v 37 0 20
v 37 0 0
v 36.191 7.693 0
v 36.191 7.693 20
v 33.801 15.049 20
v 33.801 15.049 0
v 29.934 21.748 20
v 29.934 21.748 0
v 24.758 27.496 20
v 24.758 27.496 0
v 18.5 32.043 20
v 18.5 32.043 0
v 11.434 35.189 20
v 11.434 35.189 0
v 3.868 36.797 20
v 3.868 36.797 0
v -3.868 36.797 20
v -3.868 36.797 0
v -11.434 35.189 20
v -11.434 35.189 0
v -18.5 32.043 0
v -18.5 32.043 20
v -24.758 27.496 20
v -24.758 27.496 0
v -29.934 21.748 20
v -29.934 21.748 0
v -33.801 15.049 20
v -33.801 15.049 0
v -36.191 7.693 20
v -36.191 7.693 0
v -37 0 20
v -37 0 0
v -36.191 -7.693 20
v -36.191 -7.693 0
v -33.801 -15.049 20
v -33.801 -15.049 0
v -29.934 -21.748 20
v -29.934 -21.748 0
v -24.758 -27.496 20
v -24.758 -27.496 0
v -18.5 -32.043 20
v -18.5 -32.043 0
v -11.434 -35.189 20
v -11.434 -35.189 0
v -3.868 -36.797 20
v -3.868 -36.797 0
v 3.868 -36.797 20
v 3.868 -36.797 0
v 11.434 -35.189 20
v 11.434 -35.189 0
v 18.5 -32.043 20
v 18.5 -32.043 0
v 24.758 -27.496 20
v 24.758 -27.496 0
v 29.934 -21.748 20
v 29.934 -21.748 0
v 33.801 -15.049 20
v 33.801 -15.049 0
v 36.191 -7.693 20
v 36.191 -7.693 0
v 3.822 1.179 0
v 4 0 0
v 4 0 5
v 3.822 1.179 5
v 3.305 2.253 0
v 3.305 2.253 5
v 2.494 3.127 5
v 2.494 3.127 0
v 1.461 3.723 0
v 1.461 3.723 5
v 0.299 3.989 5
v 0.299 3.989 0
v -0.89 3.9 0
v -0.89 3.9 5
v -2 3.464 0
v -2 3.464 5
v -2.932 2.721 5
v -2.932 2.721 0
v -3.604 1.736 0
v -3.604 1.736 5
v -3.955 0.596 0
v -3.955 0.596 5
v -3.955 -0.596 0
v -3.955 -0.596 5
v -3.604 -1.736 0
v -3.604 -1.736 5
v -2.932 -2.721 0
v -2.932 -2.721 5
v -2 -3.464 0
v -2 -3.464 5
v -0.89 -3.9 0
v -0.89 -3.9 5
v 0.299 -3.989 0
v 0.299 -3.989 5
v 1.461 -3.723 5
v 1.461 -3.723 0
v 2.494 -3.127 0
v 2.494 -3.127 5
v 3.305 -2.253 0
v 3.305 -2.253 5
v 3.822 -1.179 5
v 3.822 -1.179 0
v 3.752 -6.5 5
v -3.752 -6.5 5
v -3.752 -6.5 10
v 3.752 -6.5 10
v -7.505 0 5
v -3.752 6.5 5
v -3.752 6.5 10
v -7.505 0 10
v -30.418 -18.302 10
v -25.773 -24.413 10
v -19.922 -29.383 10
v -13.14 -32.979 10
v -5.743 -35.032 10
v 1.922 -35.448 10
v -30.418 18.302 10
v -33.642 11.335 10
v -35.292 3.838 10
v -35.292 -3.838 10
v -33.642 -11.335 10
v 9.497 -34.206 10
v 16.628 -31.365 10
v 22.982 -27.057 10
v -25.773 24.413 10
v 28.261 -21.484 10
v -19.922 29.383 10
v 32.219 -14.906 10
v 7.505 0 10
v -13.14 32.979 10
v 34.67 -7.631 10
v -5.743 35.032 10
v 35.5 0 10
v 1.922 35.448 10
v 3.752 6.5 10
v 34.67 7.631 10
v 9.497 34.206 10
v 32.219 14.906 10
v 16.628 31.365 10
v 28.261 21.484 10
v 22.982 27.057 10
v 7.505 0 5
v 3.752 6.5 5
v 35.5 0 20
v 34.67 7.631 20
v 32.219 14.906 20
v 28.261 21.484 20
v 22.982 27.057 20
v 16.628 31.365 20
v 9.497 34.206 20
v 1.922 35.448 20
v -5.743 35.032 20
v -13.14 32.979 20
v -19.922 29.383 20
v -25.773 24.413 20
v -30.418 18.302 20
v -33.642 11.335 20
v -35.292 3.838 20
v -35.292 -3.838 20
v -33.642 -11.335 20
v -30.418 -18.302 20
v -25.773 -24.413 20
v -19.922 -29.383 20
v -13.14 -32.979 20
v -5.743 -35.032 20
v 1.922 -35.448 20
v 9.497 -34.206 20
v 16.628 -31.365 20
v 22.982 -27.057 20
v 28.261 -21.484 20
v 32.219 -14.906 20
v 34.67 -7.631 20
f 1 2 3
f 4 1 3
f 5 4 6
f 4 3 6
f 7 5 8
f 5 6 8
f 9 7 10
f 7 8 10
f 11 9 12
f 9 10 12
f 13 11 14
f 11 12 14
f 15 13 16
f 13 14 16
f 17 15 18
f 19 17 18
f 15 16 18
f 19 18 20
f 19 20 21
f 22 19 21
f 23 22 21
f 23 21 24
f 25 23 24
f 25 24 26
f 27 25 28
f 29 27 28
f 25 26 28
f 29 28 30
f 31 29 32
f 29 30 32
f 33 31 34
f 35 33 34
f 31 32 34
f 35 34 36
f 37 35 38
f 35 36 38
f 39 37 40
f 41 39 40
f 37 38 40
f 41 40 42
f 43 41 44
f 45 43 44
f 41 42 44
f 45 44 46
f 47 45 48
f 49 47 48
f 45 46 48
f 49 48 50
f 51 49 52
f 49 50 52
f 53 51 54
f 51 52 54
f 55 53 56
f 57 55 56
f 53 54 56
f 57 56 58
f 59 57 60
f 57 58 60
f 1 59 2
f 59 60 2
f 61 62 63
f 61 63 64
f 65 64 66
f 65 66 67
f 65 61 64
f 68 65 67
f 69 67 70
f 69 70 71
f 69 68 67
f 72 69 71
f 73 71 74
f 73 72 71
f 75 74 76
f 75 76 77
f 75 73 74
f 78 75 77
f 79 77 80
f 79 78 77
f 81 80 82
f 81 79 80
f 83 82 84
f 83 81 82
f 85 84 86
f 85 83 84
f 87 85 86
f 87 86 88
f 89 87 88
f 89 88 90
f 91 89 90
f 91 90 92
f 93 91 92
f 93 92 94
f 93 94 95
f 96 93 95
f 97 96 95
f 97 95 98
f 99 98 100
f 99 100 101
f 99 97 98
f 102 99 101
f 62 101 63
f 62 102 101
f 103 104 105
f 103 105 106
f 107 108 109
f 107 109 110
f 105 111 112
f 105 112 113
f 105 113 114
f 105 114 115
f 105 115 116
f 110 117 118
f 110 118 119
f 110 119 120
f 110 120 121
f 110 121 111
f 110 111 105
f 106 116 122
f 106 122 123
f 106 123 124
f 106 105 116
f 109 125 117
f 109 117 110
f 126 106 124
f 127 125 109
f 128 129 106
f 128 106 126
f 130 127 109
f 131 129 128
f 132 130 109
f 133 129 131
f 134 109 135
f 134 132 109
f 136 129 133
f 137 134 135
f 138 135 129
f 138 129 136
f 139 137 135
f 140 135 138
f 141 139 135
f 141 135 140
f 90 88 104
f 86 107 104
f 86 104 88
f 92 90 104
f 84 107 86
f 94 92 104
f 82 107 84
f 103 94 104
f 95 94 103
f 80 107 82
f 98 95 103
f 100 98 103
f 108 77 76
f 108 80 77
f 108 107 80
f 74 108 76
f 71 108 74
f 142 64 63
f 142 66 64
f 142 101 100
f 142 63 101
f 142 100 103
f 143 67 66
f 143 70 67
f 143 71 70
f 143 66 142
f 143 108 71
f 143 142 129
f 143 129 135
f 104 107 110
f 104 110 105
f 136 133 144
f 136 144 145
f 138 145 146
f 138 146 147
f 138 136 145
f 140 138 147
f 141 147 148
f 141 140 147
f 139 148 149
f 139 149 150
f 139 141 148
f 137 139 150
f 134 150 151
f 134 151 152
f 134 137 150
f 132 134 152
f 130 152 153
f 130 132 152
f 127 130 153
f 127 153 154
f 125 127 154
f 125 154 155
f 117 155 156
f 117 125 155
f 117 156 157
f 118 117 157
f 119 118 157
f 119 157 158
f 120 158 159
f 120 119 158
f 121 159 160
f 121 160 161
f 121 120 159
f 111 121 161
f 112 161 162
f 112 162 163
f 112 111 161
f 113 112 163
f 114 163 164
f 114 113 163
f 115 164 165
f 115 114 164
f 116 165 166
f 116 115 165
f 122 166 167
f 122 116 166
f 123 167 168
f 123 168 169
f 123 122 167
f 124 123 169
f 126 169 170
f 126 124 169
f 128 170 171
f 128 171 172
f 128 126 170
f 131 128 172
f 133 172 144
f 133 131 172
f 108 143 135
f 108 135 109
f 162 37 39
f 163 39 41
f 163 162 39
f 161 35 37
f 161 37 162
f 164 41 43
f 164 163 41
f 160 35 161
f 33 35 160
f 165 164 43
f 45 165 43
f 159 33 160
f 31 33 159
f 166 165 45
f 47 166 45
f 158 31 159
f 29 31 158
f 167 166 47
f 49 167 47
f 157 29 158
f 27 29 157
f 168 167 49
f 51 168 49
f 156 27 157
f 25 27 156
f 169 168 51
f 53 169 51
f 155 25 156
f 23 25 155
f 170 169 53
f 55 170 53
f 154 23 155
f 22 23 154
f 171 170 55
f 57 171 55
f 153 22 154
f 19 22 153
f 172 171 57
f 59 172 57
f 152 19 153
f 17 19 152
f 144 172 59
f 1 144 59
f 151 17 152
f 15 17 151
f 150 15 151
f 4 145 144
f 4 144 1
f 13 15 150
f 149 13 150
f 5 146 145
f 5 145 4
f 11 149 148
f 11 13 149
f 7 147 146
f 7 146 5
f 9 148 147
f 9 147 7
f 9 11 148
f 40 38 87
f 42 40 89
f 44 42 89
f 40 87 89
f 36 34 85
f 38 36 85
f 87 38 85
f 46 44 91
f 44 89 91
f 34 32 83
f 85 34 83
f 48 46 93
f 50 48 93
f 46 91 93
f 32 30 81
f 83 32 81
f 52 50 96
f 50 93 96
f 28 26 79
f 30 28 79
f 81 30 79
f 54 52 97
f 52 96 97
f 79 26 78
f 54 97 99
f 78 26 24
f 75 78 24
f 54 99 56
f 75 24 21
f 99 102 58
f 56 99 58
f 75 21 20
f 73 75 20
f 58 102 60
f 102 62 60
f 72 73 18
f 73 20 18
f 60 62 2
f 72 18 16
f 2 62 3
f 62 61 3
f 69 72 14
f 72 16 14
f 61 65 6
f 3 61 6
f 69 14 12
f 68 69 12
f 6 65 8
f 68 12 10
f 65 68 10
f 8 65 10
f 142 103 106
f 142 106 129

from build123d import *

# Parameters (mm, degrees)
EXTRUDE_DEPTH     = 5
CYLINDER_R        = 37
CYLINDER_DEPTH    = 20
CYLINDER001_R     = 35.5
CYLINDER001_DEPTH = 10
CYLINDER002_R     = 4
CYLINDER002_DEPTH = 5


with BuildPart() as extrude_body:
    # Polygon → Extrude (new body)
    with BuildSketch(Plane.XY):
        Polygon((7.505, 0), (3.7525, 6.499521), (-3.7525, 6.499521), (-7.505, 0), (-3.7525, -6.499521), (3.7525, -6.499521), align=None)
    extrude(amount=EXTRUDE_DEPTH)


with BuildPart() as extrude_body_1:
    # Extrude placement: moved
    add(extrude_body.part.moved(Location((0, 0, 5))))


with BuildPart() as cylinder:
    # Cylinder → Cylinder (new body)
    with BuildSketch(Plane.XY):
        Circle(CYLINDER_R)
    extrude(amount=CYLINDER_DEPTH)


with BuildPart() as cut:
    # Cut base: copy of Cylinder
    add(cylinder.part)

    # Cut: cut Extrude body
    add(extrude_body_1.part, mode=Mode.SUBTRACT)


with BuildPart() as cylinder001:
    # Cylinder001 → Cylinder001 (new body)
    with BuildSketch(Plane.XY.offset(10)):
        Circle(CYLINDER001_R)
    extrude(amount=CYLINDER001_DEPTH)


with BuildPart() as cut001:
    # Cut001 base: copy of Cylinder
    add(cylinder.part)

    # Cut001: cut Cylinder001
    add(cylinder001.part, mode=Mode.SUBTRACT)


with BuildPart() as cylinder002:
    # Cylinder002 → Cylinder002 (new body)
    with BuildSketch(Plane.XY):
        Circle(CYLINDER002_R)
    extrude(amount=CYLINDER002_DEPTH)


with BuildPart() as common:
    # Cut002 base: copy of Cylinder
    add(cylinder.part)

    # Cut002: cut Cylinder002
    add(cylinder002.part, mode=Mode.SUBTRACT)

    # Common: intersect Cut, Cut001
    add(cut.part, mode=Mode.INTERSECT)
    add(cut001.part, mode=Mode.INTERSECT)


solid = common.part
